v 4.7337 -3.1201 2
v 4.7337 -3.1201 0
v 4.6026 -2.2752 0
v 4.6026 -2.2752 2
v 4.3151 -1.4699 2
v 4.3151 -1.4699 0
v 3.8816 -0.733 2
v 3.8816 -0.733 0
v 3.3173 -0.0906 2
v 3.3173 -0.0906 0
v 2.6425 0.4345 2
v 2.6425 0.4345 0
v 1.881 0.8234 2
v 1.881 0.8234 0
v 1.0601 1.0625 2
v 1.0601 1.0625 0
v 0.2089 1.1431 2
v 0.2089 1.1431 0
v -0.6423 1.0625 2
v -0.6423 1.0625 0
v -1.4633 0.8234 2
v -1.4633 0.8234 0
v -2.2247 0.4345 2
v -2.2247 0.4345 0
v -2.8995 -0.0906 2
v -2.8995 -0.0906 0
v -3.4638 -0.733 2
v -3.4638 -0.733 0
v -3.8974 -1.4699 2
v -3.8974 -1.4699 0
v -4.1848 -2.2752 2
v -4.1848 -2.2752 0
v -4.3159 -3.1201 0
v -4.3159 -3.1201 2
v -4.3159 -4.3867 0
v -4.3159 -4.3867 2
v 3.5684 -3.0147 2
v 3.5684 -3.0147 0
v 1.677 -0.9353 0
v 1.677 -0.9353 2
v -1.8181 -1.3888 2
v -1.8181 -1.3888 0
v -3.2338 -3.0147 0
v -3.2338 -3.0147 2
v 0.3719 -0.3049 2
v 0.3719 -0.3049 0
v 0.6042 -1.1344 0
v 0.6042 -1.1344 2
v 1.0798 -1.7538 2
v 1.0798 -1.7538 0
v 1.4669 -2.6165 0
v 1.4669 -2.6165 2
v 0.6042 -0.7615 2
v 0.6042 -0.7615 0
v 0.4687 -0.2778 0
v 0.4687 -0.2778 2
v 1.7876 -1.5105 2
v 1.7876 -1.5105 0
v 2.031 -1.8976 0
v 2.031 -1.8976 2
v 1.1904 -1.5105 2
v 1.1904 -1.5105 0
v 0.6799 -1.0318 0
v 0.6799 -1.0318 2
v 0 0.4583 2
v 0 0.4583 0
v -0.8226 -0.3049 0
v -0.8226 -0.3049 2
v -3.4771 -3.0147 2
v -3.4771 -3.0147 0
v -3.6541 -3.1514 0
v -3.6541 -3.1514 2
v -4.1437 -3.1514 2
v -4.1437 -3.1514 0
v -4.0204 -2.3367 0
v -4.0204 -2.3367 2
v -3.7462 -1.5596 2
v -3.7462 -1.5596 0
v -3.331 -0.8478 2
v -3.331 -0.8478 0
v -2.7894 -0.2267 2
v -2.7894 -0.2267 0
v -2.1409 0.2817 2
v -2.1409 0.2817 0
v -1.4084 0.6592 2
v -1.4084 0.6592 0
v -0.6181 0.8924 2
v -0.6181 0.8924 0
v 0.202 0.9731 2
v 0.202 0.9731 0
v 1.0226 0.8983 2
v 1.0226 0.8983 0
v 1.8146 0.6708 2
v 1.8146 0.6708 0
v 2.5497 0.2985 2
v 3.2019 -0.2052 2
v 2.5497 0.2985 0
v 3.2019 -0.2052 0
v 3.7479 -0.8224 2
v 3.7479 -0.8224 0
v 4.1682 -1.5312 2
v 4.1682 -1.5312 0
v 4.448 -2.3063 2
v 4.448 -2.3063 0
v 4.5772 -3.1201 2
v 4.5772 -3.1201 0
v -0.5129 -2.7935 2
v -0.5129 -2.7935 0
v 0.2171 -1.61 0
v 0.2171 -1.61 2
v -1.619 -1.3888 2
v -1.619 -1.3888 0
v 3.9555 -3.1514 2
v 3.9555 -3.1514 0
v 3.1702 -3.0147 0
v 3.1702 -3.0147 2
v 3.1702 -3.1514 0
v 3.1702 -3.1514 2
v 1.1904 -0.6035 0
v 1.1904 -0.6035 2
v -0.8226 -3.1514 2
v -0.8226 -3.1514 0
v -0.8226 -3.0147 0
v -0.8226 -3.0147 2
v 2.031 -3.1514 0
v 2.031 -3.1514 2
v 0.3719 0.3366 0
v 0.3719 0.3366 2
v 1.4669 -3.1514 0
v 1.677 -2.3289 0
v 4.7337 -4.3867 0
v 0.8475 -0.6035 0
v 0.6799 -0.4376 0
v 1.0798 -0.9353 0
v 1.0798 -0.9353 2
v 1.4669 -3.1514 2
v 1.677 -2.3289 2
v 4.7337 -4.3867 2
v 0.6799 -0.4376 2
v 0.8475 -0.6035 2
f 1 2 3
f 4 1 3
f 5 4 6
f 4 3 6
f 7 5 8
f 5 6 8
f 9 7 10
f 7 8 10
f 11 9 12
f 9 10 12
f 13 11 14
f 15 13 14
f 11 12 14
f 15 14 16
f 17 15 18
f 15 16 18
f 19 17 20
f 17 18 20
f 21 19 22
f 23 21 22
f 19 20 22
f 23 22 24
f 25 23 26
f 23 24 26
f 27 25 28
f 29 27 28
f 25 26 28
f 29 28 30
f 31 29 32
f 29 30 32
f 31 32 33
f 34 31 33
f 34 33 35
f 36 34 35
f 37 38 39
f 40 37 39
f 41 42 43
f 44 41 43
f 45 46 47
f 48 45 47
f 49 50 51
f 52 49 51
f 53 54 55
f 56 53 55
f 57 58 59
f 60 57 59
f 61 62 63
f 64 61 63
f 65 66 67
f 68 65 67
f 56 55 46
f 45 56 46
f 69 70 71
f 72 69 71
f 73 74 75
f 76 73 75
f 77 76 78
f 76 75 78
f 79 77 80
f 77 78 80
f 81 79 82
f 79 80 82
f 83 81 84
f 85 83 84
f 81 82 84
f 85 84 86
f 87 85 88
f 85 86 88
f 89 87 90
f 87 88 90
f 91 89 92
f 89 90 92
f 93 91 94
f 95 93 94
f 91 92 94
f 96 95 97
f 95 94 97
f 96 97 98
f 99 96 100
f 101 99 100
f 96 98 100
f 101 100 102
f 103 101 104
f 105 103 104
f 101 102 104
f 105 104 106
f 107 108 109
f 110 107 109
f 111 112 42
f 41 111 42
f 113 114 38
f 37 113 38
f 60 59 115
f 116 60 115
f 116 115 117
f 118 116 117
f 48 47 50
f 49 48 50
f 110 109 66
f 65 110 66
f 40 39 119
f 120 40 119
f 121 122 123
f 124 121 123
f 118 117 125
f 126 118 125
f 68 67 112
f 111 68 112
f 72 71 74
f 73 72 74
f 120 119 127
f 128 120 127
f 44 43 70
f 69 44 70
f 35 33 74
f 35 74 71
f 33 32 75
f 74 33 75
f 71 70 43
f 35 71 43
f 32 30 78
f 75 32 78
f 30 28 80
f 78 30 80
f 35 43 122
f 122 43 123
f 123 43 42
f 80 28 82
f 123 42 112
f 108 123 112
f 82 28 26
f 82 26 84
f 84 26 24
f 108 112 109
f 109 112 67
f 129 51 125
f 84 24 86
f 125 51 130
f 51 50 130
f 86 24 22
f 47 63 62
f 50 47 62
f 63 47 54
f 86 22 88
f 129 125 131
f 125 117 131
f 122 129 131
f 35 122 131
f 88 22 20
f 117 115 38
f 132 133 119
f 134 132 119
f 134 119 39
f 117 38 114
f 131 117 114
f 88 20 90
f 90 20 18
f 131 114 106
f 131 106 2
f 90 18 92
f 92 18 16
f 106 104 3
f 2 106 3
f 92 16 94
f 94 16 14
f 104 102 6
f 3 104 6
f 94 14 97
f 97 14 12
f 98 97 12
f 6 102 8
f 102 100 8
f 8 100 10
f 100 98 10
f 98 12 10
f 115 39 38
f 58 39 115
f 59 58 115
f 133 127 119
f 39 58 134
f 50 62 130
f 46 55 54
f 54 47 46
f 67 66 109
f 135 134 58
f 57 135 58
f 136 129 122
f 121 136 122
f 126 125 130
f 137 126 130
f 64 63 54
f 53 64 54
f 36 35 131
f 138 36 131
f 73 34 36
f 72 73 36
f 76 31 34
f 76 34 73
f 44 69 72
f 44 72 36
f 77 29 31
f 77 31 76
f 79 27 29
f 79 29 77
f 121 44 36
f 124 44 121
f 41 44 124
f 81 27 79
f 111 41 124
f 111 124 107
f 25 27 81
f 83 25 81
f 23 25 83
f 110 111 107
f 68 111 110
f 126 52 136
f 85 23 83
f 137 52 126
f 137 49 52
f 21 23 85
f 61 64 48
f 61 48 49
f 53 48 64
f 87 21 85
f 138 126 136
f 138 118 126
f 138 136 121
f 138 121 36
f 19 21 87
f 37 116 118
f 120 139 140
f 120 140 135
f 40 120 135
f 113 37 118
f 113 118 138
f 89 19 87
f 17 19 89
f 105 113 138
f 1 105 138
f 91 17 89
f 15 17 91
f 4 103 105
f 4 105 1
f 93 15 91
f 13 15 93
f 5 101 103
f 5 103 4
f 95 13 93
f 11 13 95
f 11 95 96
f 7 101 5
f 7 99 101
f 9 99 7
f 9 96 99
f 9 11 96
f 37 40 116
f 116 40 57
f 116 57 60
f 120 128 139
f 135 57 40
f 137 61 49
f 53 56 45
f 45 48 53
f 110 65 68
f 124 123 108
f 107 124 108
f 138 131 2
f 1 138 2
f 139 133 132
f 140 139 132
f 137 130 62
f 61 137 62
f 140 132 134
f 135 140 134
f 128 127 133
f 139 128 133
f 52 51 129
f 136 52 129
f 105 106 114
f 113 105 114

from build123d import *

# Parameters (mm, degrees)
F1_DEPTH = 2


with BuildPart() as f1:
    # F0 (on Top) → F1 (new body)
    with BuildSketch(Plane.XY):
        with BuildLine():
            Line((4.733724, -4.386716), (4.733724, -3.120114))
            ThreePointArc((4.733724, -3.120114), (0.208889, 1.143126), (-4.315945, -3.120114))
            Line((-4.315945, -3.120114), (-4.315945, -4.386716))
            Line((-4.315945, -4.386716), (4.733724, -4.386716))
        make_face()
        with BuildLine():
            ThreePointArc((-4.14372, -3.151427), (0.201964, 0.973099), (4.577155, -3.120114))
            Line((4.577155, -3.120114), (3.955484, -3.151427))
            Line((3.955484, -3.151427), (3.568369, -3.014677))
            Line((3.568369, -3.014677), (1.677037, -0.935318))
            Line((1.677037, -0.935318), (1.190378, -0.603505))
            Line((1.190378, -0.603505), (0.371907, 0.336631))
            Line((0.371907, 0.336631), (0.679859, -0.437599))
            Line((0.679859, -0.437599), (0.847505, -0.603505))
            Line((0.847505, -0.603505), (1.079774, -0.935318))
            Line((1.079774, -0.935318), (1.787641, -1.51046))
            Line((1.787641, -1.51046), (2.030971, -1.897575))
            Line((2.030971, -1.897575), (3.170194, -3.014677))
            Line((3.170194, -3.014677), (3.170194, -3.151427))
            Line((3.170194, -3.151427), (2.030971, -3.151427))
            Line((2.030971, -3.151427), (1.677037, -2.328931))
            Line((1.677037, -2.328931), (1.190378, -1.51046))
            Line((1.190378, -1.51046), (0.679859, -1.03181))
            Line((0.679859, -1.03181), (0.604176, -0.761511))
            Line((0.604176, -0.761511), (0.468727, -0.277765))
            Line((0.468727, -0.277765), (0.371907, -0.304874))
            Line((0.371907, -0.304874), (0.604176, -1.134406))
            Line((0.604176, -1.134406), (1.079774, -1.753789))
            Line((1.079774, -1.753789), (1.466889, -2.616502))
            Line((1.466889, -2.616502), (1.466889, -3.151427))
            Line((1.466889, -3.151427), (-0.822619, -3.151427))
            Line((-0.822619, -3.151427), (-0.822619, -3.014677))
            Line((-0.822619, -3.014677), (-0.512927, -2.793469))
            Line((-0.512927, -2.793469), (0.217061, -1.610004))
            Line((0.217061, -1.610004), (0, 0.458295))
            Line((0, 0.458295), (-0.822619, -0.304874))
            Line((-0.822619, -0.304874), (-1.618969, -1.388795))
            Line((-1.618969, -1.388795), (-1.818057, -1.388795))
            Line((-1.818057, -1.388795), (-3.233791, -3.014677))
            Line((-3.233791, -3.014677), (-3.47712, -3.014677))
            Line((-3.47712, -3.014677), (-3.654087, -3.151427))
            Line((-3.654087, -3.151427), (-4.14372, -3.151427))
        make_face(mode=Mode.SUBTRACT)
    extrude(amount=F1_DEPTH)


solid = f1.part
